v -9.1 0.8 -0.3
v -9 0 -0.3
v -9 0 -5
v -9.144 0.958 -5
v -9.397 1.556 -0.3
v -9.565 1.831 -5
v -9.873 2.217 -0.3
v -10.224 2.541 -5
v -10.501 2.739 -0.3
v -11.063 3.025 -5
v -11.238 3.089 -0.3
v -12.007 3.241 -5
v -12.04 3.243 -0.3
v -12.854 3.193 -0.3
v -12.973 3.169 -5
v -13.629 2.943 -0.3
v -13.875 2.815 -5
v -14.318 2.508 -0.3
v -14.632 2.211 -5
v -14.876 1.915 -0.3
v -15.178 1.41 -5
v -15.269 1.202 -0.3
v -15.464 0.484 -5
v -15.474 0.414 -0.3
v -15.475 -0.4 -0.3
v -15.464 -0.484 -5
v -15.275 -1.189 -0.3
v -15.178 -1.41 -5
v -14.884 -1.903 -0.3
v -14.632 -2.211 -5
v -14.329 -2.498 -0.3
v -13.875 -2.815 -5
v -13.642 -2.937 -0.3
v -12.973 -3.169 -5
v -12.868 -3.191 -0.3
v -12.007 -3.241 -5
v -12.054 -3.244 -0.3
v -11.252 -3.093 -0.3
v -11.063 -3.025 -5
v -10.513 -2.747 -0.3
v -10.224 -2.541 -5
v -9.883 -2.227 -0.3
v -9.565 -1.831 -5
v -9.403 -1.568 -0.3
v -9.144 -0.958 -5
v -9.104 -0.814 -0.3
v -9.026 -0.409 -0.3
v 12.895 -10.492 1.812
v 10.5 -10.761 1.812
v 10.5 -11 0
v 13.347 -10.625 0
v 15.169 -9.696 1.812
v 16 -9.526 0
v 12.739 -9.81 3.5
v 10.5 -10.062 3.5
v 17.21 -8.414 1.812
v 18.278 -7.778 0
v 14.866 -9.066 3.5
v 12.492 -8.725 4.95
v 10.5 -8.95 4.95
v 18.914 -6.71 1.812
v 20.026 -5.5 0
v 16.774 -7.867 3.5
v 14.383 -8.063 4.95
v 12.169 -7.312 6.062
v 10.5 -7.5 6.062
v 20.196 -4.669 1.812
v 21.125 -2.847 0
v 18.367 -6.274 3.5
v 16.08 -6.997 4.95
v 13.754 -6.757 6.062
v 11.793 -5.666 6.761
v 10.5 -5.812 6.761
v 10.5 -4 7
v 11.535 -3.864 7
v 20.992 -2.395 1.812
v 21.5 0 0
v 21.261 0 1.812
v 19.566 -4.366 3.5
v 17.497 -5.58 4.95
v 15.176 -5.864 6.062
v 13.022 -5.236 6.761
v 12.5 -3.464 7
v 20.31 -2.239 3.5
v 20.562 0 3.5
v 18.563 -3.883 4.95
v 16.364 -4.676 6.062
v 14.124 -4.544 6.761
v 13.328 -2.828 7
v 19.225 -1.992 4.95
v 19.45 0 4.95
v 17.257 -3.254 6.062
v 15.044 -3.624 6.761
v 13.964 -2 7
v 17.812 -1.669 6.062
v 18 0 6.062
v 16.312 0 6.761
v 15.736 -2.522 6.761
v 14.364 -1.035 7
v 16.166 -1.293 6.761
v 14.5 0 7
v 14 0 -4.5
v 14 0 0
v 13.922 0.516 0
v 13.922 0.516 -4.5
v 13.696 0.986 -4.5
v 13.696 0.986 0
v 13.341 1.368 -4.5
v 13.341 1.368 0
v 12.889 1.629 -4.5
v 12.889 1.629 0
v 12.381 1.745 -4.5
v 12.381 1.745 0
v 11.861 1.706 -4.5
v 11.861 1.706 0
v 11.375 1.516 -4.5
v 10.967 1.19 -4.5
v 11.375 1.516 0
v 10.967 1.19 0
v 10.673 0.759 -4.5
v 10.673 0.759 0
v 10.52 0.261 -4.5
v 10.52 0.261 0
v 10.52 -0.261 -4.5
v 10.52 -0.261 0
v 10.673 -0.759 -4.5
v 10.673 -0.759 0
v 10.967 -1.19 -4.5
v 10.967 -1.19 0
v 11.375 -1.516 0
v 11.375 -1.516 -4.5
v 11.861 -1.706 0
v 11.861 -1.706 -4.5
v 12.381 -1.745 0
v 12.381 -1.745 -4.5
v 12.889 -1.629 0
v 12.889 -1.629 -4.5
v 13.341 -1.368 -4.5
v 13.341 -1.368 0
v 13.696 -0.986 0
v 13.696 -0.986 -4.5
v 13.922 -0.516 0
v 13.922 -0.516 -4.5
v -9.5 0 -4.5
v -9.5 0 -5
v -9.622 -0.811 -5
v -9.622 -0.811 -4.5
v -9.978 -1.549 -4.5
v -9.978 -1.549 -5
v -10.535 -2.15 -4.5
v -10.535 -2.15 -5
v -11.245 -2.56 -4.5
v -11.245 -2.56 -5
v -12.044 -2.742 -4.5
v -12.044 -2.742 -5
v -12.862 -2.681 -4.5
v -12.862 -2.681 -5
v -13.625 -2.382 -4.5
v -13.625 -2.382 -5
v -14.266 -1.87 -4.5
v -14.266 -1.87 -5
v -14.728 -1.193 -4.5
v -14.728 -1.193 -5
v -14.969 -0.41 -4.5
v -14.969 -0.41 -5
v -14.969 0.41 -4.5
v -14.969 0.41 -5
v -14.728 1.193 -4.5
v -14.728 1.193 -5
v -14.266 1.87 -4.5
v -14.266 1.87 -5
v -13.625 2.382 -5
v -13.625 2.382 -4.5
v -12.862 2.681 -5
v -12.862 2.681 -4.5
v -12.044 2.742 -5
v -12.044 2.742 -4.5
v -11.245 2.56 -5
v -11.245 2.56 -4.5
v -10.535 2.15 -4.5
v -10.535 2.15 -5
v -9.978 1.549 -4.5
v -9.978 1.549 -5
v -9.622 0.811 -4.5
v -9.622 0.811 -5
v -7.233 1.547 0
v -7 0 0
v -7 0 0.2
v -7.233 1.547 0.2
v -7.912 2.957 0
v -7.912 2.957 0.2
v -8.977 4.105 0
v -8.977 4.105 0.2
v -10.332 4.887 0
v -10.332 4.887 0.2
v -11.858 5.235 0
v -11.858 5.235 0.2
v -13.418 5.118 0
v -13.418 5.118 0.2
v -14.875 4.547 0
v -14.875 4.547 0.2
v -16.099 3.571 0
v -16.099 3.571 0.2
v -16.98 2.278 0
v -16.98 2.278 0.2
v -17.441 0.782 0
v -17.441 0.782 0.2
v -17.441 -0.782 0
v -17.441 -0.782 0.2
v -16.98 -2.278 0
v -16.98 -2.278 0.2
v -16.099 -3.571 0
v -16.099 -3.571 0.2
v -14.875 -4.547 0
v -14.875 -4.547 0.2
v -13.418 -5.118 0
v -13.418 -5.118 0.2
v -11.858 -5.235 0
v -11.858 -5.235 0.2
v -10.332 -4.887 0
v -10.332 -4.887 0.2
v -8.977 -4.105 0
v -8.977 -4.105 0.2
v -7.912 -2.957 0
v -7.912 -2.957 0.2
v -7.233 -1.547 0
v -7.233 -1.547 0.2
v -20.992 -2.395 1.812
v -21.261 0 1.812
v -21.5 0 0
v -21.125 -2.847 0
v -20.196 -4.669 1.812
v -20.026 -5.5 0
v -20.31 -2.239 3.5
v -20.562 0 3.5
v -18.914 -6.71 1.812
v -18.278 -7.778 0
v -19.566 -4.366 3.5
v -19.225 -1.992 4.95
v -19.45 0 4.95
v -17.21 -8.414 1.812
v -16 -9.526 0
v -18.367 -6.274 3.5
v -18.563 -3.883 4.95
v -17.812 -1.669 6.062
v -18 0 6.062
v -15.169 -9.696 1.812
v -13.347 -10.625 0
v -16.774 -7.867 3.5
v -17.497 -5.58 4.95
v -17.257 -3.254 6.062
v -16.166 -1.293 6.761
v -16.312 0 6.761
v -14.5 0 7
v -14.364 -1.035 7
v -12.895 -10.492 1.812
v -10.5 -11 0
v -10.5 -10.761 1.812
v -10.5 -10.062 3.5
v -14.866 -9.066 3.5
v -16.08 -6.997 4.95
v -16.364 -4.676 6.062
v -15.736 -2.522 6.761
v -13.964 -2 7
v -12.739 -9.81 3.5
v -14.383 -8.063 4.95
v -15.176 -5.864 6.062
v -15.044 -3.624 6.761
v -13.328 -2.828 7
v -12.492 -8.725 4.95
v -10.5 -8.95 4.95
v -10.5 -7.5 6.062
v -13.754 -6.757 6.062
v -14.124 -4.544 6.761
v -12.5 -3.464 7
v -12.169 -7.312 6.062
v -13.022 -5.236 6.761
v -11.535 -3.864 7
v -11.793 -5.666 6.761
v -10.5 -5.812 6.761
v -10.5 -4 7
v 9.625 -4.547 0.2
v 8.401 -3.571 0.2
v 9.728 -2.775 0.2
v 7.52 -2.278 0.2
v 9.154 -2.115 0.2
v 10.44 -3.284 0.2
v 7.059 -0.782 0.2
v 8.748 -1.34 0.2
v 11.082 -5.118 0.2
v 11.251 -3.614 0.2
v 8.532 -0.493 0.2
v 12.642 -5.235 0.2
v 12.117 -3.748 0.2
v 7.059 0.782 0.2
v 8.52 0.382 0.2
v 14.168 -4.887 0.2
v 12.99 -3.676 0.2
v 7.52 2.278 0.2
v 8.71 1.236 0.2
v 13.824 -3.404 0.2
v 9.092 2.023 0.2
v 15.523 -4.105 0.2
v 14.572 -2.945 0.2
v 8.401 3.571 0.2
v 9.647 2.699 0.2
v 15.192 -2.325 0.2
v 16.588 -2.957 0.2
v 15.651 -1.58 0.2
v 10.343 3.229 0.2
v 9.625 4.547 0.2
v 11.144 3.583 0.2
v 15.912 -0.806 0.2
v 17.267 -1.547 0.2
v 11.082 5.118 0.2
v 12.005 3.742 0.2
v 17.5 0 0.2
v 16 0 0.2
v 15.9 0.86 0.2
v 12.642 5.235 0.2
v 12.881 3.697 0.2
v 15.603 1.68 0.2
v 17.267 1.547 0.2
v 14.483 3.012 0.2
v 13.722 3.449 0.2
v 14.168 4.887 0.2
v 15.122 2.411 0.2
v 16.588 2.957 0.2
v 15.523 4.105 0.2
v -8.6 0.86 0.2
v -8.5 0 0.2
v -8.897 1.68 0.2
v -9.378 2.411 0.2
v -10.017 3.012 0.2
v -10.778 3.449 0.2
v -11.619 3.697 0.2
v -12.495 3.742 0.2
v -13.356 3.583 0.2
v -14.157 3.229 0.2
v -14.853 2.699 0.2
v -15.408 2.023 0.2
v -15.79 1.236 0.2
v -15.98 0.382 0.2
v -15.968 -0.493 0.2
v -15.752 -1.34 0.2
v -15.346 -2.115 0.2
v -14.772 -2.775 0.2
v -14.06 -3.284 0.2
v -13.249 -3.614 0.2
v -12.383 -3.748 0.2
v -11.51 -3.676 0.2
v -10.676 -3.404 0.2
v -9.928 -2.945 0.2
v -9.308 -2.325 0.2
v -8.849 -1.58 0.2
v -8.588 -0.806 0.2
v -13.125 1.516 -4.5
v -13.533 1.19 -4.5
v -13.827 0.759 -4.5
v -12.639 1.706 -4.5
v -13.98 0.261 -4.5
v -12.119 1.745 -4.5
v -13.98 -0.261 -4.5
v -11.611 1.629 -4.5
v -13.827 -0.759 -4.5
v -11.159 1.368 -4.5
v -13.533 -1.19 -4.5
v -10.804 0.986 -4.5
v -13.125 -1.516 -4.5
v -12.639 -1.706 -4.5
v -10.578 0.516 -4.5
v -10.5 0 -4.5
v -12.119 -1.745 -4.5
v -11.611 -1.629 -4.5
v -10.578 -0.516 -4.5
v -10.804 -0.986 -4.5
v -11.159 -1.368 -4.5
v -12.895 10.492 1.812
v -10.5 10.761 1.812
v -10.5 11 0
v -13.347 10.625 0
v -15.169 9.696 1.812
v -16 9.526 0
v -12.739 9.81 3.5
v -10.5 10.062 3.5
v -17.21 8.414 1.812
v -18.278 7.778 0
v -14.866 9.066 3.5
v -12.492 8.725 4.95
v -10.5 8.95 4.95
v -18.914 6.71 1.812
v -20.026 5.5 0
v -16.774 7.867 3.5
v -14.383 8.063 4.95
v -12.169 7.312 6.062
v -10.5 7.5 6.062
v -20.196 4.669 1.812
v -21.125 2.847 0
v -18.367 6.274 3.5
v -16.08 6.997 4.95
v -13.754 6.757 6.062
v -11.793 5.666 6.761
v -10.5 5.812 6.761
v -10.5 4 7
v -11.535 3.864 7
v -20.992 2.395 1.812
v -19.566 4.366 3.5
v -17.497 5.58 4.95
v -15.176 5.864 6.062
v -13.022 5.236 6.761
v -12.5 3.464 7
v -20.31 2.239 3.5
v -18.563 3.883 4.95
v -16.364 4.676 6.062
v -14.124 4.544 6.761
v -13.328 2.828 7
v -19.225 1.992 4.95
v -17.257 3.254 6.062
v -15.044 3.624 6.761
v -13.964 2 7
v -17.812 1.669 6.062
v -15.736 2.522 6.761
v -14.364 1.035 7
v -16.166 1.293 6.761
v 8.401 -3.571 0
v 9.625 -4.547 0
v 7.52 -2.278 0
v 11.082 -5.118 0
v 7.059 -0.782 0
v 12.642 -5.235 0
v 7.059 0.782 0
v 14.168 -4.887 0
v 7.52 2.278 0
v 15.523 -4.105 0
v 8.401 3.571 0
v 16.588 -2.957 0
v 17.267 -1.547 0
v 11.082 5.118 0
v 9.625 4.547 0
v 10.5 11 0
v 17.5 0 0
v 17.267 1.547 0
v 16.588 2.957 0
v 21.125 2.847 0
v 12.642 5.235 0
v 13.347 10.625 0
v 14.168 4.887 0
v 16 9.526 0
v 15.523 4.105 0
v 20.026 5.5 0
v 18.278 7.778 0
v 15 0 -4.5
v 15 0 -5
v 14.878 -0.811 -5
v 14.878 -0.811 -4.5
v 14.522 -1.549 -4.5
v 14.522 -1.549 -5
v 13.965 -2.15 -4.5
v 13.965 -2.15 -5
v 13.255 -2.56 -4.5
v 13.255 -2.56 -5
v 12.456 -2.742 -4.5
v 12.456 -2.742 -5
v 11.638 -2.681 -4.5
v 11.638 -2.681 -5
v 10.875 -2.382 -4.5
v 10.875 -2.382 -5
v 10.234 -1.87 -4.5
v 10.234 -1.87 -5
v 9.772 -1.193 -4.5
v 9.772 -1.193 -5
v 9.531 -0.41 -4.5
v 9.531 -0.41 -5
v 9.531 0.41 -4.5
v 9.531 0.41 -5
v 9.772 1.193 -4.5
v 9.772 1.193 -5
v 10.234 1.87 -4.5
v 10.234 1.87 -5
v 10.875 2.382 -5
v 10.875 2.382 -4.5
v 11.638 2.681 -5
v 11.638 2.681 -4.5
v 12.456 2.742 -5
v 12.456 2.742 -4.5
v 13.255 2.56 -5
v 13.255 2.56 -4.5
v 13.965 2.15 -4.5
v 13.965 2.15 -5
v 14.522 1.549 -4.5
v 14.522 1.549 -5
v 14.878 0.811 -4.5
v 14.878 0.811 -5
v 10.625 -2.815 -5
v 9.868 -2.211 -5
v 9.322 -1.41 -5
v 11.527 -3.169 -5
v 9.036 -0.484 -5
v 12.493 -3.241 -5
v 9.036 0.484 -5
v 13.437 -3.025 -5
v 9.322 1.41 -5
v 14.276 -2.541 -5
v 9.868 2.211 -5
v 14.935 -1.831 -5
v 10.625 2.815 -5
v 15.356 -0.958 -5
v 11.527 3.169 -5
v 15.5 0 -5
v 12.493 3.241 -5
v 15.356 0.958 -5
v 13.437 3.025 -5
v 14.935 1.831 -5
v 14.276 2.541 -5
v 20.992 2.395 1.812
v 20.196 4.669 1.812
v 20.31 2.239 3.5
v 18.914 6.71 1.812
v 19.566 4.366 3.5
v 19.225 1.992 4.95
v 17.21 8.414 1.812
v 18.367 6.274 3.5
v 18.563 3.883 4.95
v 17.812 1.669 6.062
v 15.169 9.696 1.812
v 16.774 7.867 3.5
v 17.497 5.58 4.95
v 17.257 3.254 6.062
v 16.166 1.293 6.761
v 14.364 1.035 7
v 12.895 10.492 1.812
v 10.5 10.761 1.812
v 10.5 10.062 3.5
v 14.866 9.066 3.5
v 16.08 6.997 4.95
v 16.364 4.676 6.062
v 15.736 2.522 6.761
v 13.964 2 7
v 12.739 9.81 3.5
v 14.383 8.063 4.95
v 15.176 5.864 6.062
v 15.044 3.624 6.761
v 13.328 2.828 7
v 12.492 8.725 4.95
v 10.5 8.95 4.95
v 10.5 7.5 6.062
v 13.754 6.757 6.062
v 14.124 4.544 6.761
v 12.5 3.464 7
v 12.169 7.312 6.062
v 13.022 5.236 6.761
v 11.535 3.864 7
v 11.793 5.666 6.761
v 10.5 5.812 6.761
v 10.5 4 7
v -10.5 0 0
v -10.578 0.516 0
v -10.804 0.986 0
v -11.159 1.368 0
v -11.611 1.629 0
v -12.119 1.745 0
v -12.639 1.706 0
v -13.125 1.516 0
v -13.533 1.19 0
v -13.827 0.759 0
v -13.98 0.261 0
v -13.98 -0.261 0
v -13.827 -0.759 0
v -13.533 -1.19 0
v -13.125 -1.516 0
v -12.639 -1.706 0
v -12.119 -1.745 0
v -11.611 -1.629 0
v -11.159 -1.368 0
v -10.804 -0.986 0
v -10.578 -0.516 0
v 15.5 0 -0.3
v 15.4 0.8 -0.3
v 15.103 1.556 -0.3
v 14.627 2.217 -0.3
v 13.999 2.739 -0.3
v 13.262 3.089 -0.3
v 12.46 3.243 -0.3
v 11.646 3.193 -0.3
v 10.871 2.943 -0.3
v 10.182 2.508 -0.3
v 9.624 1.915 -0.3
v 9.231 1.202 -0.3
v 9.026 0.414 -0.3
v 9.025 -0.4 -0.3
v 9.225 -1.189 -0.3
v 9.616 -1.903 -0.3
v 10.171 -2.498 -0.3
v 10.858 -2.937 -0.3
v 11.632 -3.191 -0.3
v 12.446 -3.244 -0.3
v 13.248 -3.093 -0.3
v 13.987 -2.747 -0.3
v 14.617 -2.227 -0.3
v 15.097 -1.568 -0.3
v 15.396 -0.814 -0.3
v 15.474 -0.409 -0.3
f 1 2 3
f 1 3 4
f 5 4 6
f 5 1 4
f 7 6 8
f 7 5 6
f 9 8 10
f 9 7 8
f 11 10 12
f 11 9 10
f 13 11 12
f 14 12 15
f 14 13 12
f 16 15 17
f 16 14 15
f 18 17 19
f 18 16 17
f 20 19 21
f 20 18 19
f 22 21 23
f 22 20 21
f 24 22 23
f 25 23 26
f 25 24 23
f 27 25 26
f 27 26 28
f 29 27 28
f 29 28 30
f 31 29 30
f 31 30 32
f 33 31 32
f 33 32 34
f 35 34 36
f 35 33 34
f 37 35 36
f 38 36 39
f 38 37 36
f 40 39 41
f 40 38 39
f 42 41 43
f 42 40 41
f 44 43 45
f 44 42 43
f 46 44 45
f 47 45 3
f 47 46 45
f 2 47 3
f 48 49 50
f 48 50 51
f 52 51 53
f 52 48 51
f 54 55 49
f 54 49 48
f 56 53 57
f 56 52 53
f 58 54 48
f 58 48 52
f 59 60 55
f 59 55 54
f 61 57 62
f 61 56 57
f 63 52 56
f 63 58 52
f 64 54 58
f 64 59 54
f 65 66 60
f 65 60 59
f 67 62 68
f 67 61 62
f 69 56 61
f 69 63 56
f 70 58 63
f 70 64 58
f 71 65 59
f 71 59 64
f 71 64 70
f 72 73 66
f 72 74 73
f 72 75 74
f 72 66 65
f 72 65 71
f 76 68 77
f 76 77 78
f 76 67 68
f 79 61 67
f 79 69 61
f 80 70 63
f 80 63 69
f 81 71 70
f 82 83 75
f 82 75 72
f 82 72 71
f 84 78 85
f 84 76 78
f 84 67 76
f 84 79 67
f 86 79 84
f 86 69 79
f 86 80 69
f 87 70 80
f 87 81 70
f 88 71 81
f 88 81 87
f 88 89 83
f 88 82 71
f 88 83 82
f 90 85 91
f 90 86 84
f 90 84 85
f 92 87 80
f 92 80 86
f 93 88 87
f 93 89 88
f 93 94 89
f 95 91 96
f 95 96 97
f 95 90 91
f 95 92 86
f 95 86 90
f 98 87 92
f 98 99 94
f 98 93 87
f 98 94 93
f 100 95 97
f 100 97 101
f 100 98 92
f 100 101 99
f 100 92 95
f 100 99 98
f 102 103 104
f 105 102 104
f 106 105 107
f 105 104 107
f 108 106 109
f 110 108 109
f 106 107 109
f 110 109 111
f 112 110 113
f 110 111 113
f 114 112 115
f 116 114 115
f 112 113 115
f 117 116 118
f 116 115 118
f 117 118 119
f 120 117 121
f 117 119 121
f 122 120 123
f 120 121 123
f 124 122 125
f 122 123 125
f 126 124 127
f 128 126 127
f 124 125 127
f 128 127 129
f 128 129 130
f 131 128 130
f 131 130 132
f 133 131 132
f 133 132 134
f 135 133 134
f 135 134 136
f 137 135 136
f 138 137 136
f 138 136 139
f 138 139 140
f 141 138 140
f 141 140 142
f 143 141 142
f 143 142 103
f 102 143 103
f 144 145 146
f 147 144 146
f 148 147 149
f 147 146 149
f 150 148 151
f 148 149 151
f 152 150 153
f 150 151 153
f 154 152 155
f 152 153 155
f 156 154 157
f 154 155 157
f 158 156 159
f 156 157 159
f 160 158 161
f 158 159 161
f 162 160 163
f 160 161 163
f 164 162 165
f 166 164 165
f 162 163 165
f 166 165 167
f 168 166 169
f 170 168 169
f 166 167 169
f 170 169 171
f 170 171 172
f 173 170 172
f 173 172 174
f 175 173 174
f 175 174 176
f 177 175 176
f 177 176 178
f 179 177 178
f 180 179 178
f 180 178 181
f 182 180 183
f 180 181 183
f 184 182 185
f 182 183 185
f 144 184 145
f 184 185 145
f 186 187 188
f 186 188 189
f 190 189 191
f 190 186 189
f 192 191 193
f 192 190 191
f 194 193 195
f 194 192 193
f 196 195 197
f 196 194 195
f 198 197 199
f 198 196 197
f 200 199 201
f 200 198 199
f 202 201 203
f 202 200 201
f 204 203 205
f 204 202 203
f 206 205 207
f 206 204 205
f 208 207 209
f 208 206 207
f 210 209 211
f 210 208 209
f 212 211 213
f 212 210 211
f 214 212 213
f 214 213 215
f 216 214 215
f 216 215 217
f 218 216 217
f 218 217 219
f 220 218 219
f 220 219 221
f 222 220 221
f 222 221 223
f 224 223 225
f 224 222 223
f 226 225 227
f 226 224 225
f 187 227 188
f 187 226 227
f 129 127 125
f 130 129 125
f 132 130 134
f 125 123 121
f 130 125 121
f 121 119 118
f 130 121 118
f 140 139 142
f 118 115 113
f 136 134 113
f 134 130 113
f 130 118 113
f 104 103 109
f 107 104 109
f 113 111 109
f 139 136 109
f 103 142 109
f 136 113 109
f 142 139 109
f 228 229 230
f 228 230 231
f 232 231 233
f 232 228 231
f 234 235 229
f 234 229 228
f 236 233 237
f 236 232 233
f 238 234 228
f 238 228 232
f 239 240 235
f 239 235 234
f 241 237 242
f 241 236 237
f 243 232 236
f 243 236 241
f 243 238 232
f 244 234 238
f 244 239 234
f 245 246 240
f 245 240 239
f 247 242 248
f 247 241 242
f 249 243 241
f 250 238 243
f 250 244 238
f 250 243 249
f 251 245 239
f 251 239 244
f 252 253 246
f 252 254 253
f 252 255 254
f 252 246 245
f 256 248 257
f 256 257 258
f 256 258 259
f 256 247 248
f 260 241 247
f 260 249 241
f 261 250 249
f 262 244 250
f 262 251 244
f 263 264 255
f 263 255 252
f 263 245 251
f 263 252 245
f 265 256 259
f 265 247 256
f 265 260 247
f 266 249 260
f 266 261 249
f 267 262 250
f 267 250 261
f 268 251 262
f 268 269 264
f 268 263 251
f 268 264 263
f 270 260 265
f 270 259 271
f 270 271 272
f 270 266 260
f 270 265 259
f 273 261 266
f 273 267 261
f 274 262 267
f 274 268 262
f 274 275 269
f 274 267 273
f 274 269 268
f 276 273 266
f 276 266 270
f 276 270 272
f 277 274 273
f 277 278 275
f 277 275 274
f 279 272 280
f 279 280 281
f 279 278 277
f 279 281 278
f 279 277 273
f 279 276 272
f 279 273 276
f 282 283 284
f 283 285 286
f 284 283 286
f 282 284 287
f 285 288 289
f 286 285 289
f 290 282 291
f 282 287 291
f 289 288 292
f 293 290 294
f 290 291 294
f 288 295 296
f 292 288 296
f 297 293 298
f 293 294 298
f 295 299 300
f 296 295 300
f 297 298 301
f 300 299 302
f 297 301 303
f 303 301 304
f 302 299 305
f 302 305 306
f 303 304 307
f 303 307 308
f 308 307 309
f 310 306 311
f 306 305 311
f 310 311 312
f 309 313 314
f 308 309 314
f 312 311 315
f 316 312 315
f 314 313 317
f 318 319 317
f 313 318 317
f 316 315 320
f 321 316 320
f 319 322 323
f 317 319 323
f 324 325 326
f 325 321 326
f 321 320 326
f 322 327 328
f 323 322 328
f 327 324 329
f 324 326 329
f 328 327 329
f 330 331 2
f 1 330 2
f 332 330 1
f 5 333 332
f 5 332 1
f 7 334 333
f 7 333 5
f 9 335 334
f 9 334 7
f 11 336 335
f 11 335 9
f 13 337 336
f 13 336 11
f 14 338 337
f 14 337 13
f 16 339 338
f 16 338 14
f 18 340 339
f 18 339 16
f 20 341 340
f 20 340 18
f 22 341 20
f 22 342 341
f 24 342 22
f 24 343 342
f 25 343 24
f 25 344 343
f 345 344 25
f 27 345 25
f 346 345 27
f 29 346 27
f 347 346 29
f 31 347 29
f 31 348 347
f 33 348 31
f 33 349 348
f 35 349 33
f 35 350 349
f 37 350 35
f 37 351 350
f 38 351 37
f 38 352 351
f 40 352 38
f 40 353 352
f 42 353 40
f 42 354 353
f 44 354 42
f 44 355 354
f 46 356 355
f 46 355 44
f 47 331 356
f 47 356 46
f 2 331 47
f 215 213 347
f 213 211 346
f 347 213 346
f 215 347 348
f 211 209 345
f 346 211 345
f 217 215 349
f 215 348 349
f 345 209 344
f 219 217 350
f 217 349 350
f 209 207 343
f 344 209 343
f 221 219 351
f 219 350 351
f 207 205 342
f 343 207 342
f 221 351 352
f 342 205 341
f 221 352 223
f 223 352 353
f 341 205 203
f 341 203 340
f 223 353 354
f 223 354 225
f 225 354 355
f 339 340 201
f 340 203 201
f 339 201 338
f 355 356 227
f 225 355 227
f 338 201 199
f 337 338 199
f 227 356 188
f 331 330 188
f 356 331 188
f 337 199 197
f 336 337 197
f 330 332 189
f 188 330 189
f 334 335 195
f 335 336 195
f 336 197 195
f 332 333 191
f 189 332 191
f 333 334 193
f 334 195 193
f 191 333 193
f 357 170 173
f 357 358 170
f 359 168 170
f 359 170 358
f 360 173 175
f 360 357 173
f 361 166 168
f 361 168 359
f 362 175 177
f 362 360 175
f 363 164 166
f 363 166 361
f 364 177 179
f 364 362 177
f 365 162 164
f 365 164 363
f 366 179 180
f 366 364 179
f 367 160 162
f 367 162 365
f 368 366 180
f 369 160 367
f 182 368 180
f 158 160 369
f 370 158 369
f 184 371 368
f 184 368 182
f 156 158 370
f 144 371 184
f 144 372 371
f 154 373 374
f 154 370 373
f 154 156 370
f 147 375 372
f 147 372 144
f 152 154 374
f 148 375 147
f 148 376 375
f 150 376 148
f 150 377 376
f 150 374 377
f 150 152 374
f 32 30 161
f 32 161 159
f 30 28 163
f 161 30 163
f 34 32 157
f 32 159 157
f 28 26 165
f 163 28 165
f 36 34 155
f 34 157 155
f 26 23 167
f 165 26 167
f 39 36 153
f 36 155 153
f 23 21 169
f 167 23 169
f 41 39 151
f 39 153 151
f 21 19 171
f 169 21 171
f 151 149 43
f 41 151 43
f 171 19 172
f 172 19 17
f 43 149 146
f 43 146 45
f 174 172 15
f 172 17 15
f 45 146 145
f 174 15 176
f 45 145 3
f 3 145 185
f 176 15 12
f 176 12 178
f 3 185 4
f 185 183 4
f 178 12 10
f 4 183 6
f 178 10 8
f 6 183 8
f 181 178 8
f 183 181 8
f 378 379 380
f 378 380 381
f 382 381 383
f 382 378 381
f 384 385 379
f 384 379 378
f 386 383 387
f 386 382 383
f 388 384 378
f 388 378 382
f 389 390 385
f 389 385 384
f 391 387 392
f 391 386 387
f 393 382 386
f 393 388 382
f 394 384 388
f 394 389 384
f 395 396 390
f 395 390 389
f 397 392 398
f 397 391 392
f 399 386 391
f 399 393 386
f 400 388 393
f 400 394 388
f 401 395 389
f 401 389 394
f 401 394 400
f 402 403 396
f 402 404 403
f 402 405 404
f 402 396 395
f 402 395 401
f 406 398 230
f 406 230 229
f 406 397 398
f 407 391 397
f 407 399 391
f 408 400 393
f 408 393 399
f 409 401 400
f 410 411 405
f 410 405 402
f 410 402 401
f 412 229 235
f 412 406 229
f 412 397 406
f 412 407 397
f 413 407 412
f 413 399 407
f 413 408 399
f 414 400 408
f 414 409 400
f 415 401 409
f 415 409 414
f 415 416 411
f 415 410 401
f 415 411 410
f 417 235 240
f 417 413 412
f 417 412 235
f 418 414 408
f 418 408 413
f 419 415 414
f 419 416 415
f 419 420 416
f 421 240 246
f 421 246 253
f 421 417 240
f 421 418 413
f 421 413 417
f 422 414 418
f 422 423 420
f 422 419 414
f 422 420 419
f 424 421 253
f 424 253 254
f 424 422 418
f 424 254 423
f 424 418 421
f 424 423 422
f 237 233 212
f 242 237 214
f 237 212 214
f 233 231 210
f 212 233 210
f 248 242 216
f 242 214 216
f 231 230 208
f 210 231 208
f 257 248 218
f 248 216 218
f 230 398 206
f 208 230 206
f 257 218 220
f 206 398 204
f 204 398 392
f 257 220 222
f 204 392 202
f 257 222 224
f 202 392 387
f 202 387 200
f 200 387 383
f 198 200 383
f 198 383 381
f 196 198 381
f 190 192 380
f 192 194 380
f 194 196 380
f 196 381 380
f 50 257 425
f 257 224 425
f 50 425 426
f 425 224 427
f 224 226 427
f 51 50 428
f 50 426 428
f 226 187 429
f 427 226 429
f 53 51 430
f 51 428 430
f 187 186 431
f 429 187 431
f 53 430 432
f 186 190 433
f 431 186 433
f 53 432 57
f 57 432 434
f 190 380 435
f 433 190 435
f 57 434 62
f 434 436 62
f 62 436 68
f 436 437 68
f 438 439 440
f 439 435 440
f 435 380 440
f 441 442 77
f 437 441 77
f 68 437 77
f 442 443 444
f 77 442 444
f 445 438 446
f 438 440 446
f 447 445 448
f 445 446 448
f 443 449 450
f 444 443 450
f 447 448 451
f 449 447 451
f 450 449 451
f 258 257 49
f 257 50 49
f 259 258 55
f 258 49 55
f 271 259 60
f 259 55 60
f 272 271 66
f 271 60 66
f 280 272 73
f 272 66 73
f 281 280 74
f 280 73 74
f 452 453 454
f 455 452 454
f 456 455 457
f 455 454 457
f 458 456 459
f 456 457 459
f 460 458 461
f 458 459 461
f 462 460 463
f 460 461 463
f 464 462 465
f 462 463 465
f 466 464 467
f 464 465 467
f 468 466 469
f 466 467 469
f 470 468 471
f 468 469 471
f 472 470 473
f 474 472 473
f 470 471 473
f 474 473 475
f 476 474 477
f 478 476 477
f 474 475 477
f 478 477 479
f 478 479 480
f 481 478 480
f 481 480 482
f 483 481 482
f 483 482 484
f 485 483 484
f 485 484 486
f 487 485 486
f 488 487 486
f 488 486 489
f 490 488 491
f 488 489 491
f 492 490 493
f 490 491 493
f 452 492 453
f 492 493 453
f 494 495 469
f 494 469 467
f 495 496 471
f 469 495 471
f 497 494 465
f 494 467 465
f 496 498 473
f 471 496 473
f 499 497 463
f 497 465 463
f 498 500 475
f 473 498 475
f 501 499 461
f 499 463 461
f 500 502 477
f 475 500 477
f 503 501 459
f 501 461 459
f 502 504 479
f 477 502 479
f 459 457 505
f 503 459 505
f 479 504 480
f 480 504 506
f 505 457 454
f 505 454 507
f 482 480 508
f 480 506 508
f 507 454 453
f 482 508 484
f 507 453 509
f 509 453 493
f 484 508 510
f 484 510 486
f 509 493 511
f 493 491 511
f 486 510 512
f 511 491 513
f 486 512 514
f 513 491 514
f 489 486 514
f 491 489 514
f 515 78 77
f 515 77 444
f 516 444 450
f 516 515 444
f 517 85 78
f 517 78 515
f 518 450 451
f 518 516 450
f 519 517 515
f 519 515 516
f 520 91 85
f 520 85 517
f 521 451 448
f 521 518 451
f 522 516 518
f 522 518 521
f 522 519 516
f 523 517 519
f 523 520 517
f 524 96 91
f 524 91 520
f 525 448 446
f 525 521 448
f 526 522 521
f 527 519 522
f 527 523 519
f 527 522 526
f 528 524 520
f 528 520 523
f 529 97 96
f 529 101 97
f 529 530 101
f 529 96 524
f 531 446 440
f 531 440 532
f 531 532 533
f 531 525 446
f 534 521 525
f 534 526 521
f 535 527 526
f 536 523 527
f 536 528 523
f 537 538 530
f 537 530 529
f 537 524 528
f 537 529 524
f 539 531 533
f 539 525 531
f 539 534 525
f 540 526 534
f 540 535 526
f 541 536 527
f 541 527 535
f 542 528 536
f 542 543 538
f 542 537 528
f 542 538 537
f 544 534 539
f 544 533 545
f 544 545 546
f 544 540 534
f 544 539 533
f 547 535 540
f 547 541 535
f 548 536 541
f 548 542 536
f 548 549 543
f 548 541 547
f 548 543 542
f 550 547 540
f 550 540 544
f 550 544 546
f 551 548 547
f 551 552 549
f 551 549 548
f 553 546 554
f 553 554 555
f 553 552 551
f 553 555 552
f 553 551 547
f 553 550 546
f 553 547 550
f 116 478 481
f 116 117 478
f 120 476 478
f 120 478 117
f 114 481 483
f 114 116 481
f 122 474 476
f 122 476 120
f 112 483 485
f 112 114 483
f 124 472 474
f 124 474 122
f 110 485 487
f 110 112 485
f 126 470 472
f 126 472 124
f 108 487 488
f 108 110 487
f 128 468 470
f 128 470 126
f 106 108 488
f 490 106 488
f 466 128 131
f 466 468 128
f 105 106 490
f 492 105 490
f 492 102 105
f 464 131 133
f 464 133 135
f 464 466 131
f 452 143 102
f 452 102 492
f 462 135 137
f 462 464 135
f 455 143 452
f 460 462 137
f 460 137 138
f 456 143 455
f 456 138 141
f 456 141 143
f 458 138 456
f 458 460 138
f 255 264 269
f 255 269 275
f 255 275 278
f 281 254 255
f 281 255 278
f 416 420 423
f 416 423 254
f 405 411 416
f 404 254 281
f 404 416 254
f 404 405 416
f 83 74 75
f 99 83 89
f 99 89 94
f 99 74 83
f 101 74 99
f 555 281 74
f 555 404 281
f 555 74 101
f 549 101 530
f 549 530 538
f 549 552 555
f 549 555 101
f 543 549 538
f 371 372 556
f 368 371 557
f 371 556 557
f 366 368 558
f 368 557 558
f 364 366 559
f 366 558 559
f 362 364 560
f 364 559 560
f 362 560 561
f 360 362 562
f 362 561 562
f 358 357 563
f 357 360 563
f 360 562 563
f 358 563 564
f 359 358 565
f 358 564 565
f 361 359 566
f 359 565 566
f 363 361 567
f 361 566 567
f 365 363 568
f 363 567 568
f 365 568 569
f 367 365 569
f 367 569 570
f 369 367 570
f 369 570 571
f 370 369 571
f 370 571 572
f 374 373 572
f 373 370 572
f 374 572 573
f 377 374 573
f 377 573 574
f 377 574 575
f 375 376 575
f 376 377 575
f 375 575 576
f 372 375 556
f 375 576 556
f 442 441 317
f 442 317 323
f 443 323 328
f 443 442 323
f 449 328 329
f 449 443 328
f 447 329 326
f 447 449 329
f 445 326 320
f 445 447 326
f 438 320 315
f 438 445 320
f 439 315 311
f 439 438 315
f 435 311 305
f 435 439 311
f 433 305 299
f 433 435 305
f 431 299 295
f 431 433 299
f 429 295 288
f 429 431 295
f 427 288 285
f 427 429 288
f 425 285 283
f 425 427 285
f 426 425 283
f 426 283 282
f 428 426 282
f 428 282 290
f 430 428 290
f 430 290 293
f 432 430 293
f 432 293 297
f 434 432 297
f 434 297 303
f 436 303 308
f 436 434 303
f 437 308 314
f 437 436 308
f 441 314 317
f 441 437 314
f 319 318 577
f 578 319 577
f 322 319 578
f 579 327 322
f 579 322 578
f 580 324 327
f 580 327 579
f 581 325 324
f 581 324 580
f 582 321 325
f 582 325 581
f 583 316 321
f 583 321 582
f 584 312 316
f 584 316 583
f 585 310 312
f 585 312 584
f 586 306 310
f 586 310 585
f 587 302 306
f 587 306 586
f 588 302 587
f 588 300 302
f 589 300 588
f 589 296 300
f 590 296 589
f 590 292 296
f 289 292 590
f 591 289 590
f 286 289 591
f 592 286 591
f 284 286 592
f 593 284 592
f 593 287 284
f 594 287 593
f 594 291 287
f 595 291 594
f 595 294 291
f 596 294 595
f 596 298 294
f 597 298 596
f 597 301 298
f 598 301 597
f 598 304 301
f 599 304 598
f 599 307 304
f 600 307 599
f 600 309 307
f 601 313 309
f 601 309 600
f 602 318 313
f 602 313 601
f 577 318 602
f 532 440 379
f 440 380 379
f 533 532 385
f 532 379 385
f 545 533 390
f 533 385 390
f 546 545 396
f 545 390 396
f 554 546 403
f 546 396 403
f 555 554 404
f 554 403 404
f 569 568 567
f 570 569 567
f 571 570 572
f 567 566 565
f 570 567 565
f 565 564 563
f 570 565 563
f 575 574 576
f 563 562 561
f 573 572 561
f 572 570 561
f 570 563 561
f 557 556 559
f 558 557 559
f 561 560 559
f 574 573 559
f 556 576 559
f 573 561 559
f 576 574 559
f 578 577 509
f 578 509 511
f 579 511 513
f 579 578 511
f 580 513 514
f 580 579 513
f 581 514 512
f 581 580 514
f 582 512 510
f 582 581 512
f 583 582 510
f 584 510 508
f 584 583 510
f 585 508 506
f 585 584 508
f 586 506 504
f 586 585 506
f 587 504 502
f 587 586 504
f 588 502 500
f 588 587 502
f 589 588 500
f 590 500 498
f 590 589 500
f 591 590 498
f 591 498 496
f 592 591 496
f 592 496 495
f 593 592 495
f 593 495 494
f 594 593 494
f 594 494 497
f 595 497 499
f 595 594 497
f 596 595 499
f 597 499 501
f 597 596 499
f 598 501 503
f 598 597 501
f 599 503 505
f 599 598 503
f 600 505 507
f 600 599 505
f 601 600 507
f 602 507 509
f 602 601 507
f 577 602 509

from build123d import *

# Parameters (mm, degrees)
F0_R     = 5.25
F0_R_2   = 3.25
F0_R_3   = 1.75
F1_DEPTH = 7
F2_R     = 6.99999
F3_DEPTH = 5
F4_DEPTH = 0.2
F5_SIZE  = 0.5
F6_R     = 2.75
F6_R_2   = 1.75
F7_DEPTH = 0.5


# Not quite as in the source:
# - a fillet or chamfer is up to 0.001 mm smaller than in the source, because OpenCascade refuses the exact size
# - a feature names something its author has since deleted; it is built from what else it names


with BuildPart() as f1:
    # F0 (on Top) → F1 (new body)
    with BuildSketch(Plane.XY):
        with BuildLine():
            Line((10.5, 11), (-10.5, 11))
            ThreePointArc((-10.5, 11), (-18.2781745931, 7.7781745931), (-21.5, 0))
            ThreePointArc((-21.5, 0), (-18.2781745931, -7.7781745931), (-10.5, -11))
            Line((-10.5, -11), (10.5, -11))
            ThreePointArc((10.5, -11), (18.2781745931, -7.7781745931), (21.5, 0))
            ThreePointArc((21.5, 0), (18.2781745931, 7.7781745931), (10.5, 11))
        make_face()
        with Locations((-12.25, 0)):
            Circle(F0_R, mode=Mode.SUBTRACT)
        with Locations((12.25, 0)):
            Circle(F0_R, mode=Mode.SUBTRACT)
        with Locations((-12.25, 0)):
            Circle(F0_R)
        with Locations((-12.25, 0)):
            Circle(F0_R_2, mode=Mode.SUBTRACT)
        with Locations((12.25, 0)):
            Circle(F0_R)
        with Locations((12.25, 0)):
            Circle(F0_R_2, mode=Mode.SUBTRACT)
        with Locations((12.25, 0)):
            Circle(F0_R_2)
        with Locations((12.25, 0)):
            Circle(F0_R_3, mode=Mode.SUBTRACT)
        with Locations((-12.25, 0)):
            Circle(F0_R_2)
        with Locations((-12.25, 0)):
            Circle(F0_R_3, mode=Mode.SUBTRACT)
        with Locations((-12.25, 0)):
            Circle(F0_R_3)
        with Locations((12.25, 0)):
            Circle(F0_R_3)
    extrude(amount=F1_DEPTH)

    # F2 (radius 7 in the source; OpenCascade refuses exactly that, so slightly less here)
    f2_edges = [f1.edges().sort_by_distance(p)[0] for p in [
        (0, 11, 7),
    ]]
    fillet(f2_edges, radius=F2_R)

    # F0 (on Top) → F3 (join)
    with BuildSketch(Plane.XY):
        with Locations((12.25, 0)):
            Circle(F0_R_2)
        with Locations((12.25, 0)):
            Circle(F0_R_3, mode=Mode.SUBTRACT)
        with Locations((-12.25, 0)):
            Circle(F0_R_2)
        with Locations((-12.25, 0)):
            Circle(F0_R_3, mode=Mode.SUBTRACT)
    extrude(amount=-F3_DEPTH)

    # F0 (on Top) → F4 (cut)
    with BuildSketch(Plane.XY):
        with Locations((-12.25, 0)):
            Circle(F0_R)
        with Locations((-12.25, 0)):
            Circle(F0_R_2, mode=Mode.SUBTRACT)
        with Locations((12.25, 0)):
            Circle(F0_R)
        with Locations((12.25, 0)):
            Circle(F0_R_2, mode=Mode.SUBTRACT)
    extrude(amount=F4_DEPTH, mode=Mode.SUBTRACT)

    # F5
    f5_edges = [f1.edges().sort_by_distance(p)[0] for p in [
        (-15.5, 0, 0.2),
        (9, 0, 0.2),
    ]]
    chamfer(f5_edges, length=F5_SIZE)

    # F6 (on face) → F7 (cut)
    with BuildSketch(Plane(origin=(0, 0, -5), x_dir=(1, 0, 0), z_dir=(0, 0, -1))):
        with Locations((-12.25, 0)):
            Circle(F6_R)
        with Locations((-12.25, 0)):
            Circle(F6_R_2, mode=Mode.SUBTRACT)
        with Locations((12.25, 0)):
            Circle(F6_R)
    extrude(amount=-F7_DEPTH, mode=Mode.SUBTRACT)


solid = f1.part
